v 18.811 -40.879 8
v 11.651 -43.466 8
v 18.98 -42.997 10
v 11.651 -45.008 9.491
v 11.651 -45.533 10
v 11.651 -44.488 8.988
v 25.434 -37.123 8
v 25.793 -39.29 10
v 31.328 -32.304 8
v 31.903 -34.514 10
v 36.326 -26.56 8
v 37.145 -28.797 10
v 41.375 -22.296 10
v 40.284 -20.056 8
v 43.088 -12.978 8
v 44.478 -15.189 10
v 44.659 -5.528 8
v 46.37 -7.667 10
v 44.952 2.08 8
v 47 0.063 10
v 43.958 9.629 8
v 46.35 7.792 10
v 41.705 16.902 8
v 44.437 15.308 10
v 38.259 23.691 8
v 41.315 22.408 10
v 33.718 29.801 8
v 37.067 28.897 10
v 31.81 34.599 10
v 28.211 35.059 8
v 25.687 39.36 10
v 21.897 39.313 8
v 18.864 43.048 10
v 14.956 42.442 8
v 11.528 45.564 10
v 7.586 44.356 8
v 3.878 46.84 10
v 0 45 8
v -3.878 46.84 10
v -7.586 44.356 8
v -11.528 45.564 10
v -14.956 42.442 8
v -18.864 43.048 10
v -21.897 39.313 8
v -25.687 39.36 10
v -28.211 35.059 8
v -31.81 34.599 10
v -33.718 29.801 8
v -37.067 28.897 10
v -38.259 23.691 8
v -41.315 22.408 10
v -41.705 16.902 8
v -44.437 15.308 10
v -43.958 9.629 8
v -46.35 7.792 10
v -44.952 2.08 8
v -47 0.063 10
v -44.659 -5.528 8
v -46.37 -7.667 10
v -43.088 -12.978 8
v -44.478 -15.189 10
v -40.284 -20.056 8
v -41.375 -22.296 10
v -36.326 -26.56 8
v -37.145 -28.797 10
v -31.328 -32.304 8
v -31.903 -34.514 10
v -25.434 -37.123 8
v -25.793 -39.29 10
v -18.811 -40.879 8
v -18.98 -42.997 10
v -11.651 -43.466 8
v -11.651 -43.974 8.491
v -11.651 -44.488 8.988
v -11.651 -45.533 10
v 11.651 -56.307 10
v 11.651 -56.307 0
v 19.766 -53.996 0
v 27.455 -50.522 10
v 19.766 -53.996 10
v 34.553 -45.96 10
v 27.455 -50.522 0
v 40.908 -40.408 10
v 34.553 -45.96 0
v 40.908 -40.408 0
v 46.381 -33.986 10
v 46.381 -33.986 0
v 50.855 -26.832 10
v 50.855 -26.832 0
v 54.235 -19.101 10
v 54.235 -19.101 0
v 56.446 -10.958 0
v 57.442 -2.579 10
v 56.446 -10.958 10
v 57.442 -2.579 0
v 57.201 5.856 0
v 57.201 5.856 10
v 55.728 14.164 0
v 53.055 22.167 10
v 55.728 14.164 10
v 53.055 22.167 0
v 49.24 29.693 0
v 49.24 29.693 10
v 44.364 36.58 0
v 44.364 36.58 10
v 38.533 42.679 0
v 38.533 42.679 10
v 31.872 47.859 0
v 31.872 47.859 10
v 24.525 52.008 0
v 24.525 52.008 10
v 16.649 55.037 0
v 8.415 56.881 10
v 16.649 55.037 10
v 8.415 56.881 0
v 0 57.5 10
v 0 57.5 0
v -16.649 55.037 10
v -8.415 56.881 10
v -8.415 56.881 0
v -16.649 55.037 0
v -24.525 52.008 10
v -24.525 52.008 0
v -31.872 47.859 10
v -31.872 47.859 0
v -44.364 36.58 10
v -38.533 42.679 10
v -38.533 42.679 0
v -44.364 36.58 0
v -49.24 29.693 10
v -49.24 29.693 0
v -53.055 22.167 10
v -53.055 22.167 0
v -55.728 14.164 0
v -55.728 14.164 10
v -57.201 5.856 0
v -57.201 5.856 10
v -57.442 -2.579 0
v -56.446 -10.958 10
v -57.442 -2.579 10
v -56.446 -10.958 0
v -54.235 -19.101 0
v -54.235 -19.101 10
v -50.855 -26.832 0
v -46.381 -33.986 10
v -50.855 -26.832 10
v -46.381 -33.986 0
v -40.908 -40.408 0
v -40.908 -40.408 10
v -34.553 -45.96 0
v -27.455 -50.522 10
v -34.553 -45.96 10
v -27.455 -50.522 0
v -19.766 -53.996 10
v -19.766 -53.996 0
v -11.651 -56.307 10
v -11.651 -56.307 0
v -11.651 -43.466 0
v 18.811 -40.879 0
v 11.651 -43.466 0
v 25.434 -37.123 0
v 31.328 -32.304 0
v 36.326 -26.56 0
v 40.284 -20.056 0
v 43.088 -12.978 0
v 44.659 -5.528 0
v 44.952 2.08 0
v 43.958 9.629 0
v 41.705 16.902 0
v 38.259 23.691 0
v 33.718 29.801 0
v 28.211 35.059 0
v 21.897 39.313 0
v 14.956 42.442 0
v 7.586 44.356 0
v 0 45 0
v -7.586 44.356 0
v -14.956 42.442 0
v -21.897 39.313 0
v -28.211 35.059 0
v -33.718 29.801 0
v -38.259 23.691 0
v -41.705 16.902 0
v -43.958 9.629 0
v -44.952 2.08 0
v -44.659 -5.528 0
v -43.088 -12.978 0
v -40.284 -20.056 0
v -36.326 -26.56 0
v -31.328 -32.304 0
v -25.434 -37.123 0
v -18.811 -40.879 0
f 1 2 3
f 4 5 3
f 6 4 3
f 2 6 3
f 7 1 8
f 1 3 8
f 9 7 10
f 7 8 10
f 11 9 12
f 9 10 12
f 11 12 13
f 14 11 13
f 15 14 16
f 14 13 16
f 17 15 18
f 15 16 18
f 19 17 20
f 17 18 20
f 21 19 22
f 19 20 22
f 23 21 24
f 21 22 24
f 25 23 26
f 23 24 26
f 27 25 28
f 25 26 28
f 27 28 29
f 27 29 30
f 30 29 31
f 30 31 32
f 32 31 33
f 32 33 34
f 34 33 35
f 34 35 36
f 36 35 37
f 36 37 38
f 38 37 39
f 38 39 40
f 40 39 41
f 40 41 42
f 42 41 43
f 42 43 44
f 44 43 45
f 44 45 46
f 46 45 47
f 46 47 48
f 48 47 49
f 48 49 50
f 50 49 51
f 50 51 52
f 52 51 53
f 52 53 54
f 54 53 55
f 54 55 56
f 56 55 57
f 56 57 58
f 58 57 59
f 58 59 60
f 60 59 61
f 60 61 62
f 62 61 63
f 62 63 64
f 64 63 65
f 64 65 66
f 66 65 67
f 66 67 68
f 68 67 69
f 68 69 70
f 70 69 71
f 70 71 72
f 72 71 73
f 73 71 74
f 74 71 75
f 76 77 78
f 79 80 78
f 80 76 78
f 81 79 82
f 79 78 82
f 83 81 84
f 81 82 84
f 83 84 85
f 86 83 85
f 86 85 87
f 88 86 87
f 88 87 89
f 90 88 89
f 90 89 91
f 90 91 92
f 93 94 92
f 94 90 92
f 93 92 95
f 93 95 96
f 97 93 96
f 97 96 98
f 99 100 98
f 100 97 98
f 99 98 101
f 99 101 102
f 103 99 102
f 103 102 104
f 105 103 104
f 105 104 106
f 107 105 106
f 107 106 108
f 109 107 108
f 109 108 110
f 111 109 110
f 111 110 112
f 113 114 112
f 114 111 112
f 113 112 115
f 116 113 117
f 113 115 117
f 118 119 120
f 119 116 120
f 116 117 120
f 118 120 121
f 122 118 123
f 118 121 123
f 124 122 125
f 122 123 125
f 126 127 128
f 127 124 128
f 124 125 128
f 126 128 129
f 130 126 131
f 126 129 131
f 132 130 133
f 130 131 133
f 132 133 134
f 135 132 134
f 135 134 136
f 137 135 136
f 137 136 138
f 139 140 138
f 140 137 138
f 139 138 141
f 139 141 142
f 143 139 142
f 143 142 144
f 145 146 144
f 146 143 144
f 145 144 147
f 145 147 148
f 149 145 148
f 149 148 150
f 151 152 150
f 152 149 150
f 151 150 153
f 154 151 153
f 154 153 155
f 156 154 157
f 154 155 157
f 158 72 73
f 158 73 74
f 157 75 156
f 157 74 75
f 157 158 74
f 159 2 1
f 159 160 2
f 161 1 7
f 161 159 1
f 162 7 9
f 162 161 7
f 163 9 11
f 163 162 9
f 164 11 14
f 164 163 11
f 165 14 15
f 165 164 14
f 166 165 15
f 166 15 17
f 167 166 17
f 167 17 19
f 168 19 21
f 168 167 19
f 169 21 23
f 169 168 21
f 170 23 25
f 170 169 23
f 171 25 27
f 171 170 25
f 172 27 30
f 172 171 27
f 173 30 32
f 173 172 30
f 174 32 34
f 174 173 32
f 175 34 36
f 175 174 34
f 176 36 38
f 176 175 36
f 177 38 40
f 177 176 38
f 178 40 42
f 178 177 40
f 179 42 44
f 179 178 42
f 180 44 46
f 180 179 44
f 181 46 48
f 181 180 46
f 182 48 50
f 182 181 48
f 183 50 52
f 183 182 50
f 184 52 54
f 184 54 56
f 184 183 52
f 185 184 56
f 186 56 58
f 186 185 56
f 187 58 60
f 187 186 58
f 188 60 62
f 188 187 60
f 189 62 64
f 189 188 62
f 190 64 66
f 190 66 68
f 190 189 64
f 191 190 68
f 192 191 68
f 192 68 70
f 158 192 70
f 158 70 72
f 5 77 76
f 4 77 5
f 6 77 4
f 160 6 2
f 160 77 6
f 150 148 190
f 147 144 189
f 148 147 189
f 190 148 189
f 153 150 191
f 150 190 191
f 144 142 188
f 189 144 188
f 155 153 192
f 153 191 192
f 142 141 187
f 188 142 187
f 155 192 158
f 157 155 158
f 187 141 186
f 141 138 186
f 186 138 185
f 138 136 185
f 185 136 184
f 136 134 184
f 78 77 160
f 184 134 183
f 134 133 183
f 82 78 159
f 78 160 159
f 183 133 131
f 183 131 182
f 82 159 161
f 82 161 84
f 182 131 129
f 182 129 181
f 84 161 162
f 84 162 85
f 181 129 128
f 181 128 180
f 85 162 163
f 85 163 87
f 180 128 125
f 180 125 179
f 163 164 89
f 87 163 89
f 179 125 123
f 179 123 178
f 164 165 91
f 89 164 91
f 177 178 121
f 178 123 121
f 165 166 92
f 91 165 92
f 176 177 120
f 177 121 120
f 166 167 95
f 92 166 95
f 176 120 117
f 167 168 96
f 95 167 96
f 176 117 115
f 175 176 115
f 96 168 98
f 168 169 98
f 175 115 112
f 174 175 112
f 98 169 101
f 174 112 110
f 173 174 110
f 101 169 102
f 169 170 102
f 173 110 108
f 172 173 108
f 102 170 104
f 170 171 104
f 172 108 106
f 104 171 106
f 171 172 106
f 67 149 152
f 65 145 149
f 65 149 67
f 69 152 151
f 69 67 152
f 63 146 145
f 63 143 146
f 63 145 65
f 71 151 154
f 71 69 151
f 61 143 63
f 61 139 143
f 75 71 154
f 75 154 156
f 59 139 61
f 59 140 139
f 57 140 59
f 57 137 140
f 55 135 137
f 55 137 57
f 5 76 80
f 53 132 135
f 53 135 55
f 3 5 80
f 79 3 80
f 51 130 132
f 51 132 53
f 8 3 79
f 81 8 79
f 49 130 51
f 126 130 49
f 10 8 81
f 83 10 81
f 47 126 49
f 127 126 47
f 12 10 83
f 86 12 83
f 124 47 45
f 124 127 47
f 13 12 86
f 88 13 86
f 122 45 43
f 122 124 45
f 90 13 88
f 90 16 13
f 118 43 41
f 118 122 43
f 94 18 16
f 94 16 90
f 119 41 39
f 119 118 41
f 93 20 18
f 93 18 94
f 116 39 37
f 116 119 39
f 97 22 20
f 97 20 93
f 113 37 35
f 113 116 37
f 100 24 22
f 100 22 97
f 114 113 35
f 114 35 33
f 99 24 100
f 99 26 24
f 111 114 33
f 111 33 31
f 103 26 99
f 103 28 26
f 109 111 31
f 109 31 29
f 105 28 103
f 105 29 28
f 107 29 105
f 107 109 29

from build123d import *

# Parameters (mm, degrees)
SKETCH1_R           = 57.5
SKETCH1_R_2         = 45
BOSS_EXTRUDE1_DEPTH = 10
CUT_EXTRUDE2_DEPTH  = 10
CHAMFER1_SIZE       = 2


with BuildPart() as part:
    # Sketch1 → Boss-Extrude1 (new body)
    with BuildSketch(Plane(origin=(0, 0, 0), x_dir=(0, 1, 0), z_dir=(0, 0, 1))):
        Circle(SKETCH1_R)
        Circle(SKETCH1_R_2, mode=Mode.SUBTRACT)
    extrude(amount=BOSS_EXTRUDE1_DEPTH)

    # Sketch2 → Cut-Extrude2 (cut)
    with BuildSketch(Plane(origin=(0, 0, 0), x_dir=(1, 0, 0), z_dir=(0, 0, -1))):
        with BuildLine():
            Line((11.650511373, 56.659857386), (11.650511373, 43.46568284))
            add(Edge.make_bspline(
                [(11.650511373, 43.46568284), (-0.679246558, 46.406413024), (-11.650511373, 43.46568284)],
                knots=[0, 0, 0, 0.575547458, 0.575547458, 0.575547458], degree=2))
            Line((-11.650511373, 43.46568284), (-11.650511373, 56.659857386))
            ThreePointArc((-11.650511373, 56.659857386), (0, 57.845257837), (11.650511373, 56.659857386))
        make_face()
    extrude(amount=-CUT_EXTRUDE2_DEPTH, mode=Mode.SUBTRACT)

    # Chamfer1
    chamfer1_edges = [part.edges().sort_by_distance(p)[0] for p in [
        (0, 45, 10),
    ]]
    chamfer(chamfer1_edges, length=CHAMFER1_SIZE)


solid = part.part
